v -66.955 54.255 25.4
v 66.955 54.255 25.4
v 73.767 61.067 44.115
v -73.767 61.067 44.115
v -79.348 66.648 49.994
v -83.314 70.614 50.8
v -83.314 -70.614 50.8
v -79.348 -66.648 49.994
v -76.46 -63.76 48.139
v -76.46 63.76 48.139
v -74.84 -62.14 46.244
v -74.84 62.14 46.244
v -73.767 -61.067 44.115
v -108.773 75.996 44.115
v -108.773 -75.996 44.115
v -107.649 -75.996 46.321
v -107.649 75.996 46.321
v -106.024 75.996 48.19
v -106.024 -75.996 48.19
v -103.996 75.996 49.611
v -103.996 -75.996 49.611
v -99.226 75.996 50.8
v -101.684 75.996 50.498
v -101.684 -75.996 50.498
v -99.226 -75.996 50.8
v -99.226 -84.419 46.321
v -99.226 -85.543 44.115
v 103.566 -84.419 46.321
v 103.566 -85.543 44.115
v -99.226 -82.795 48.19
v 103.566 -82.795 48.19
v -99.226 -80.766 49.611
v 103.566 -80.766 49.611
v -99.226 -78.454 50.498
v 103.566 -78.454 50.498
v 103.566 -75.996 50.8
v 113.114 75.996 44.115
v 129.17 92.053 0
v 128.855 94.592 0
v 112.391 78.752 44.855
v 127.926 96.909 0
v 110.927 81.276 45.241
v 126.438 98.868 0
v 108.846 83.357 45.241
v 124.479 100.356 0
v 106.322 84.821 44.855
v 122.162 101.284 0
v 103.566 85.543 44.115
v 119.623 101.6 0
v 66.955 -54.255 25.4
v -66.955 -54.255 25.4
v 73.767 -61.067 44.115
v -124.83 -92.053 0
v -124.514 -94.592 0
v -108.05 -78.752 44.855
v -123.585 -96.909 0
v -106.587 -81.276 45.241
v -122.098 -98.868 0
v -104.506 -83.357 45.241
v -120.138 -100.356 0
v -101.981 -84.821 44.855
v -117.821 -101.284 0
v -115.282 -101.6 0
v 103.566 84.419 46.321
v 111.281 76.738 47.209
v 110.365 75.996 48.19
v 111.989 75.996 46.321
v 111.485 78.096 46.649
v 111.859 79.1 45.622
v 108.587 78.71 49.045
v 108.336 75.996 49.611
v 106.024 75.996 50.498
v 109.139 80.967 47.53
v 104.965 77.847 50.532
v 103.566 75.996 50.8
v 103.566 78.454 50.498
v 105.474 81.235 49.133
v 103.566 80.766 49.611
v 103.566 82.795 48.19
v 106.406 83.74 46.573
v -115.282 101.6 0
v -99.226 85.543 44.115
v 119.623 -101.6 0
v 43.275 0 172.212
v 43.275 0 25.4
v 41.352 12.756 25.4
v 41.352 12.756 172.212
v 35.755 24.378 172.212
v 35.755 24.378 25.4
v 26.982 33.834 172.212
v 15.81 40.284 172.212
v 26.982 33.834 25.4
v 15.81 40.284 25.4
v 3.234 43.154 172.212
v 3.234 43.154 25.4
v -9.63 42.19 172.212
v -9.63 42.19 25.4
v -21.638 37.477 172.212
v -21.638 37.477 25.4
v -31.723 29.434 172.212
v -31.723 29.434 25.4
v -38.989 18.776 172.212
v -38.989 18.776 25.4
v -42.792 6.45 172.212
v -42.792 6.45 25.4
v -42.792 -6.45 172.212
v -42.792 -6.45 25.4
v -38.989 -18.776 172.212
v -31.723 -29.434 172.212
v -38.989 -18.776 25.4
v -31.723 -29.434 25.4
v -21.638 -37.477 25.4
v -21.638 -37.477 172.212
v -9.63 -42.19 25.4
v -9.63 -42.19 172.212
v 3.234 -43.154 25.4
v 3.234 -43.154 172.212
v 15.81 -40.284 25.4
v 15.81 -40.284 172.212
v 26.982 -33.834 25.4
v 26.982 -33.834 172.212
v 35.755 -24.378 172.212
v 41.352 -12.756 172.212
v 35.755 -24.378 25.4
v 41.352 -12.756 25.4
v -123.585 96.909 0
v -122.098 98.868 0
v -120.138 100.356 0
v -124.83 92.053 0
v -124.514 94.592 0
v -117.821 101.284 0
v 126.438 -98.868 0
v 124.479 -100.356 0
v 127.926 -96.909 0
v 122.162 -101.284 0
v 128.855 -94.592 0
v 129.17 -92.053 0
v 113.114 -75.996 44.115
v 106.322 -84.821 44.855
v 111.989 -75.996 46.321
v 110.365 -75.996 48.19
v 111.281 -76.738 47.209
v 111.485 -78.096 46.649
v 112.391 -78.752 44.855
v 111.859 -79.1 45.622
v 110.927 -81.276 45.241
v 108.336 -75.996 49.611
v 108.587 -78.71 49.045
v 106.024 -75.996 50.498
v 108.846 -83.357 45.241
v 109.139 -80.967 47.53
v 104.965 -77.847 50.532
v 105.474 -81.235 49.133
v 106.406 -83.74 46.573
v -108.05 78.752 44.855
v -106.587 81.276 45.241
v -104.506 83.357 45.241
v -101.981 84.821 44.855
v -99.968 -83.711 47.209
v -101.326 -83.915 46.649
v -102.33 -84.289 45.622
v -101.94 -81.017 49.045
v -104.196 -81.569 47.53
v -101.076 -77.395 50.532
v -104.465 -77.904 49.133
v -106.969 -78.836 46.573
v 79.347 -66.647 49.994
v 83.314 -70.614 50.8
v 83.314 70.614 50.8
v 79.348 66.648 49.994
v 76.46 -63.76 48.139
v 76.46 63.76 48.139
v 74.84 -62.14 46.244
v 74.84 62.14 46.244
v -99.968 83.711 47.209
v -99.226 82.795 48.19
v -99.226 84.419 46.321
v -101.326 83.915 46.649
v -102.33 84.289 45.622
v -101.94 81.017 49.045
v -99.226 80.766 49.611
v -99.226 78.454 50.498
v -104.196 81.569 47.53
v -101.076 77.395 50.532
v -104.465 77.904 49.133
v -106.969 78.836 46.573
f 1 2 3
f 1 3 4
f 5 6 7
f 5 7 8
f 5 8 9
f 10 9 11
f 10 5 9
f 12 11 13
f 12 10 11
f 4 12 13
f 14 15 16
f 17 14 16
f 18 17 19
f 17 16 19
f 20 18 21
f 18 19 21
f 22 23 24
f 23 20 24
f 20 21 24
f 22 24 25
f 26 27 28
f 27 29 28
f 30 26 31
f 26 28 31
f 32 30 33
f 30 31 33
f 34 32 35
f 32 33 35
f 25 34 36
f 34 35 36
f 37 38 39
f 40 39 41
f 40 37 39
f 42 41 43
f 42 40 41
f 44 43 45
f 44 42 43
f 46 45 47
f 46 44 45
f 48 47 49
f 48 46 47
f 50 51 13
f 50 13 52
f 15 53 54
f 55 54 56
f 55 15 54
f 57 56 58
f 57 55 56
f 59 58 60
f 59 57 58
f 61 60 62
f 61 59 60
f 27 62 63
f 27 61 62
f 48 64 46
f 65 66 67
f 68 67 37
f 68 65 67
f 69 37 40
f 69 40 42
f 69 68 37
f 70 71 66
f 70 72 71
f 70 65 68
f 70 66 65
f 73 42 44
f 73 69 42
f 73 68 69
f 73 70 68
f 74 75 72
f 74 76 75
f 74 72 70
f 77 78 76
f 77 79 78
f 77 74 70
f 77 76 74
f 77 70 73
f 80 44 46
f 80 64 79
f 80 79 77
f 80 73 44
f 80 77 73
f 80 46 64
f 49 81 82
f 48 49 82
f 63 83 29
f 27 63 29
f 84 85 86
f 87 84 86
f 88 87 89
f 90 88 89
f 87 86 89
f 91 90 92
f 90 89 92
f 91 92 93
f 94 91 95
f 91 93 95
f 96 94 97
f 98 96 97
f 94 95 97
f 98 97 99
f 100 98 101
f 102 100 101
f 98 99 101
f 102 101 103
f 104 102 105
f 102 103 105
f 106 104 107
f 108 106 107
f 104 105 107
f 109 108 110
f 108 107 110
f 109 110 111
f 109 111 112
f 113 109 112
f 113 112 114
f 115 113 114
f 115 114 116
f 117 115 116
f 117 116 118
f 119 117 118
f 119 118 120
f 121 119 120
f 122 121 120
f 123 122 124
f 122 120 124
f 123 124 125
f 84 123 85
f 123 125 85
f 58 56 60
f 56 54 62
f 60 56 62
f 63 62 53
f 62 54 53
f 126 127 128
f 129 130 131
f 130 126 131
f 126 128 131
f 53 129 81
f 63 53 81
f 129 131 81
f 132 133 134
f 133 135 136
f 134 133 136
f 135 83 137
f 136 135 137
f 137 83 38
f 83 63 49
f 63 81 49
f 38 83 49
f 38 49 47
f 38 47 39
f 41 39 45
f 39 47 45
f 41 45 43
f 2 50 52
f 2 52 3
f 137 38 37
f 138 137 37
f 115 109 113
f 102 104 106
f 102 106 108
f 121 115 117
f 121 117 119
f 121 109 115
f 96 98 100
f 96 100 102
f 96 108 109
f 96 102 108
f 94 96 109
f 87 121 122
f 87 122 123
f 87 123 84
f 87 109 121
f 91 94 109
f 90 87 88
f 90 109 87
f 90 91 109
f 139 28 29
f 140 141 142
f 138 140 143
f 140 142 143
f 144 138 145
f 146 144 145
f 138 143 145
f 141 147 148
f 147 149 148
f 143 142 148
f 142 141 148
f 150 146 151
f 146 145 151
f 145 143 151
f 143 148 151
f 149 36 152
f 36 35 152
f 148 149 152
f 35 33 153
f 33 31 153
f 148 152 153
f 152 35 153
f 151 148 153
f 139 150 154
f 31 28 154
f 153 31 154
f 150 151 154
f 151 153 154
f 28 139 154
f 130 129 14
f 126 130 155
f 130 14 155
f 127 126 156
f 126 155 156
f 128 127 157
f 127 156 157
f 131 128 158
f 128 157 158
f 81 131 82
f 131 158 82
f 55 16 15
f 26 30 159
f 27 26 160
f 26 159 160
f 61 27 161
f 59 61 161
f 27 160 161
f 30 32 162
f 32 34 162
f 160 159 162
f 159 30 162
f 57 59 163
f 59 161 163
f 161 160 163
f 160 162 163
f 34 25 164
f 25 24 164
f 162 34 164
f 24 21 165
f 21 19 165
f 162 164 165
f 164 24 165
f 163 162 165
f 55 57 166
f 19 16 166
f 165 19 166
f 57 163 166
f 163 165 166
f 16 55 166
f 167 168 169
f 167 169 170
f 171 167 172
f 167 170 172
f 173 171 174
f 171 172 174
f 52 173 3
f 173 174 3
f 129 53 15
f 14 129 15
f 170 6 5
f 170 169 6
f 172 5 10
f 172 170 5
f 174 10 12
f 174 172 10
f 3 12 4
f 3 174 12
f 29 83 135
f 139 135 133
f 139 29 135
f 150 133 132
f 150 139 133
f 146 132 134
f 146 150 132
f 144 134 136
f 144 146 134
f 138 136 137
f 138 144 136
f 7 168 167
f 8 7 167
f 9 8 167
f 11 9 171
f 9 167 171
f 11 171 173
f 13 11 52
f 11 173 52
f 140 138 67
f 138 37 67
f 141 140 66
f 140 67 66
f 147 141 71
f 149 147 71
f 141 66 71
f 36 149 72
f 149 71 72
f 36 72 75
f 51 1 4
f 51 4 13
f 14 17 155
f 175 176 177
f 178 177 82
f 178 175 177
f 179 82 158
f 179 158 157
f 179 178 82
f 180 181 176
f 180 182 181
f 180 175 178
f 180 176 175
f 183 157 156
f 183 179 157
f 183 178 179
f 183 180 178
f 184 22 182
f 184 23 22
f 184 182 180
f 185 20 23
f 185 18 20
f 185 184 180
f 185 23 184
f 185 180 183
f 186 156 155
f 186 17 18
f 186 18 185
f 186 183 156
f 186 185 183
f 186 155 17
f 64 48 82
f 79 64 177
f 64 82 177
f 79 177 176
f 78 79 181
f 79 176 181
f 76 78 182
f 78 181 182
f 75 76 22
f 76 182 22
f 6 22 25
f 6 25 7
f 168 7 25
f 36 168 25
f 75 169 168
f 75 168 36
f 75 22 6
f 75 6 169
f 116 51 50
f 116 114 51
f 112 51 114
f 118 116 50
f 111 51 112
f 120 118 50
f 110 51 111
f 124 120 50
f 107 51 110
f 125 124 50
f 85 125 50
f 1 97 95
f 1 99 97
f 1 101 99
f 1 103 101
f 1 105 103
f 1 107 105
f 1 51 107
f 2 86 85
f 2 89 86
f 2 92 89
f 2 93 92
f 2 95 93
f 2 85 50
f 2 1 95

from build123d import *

# Parameters (mm, degrees)
F0_W     = 254
F0_H     = 203.2
F1_DEPTH = 50.8
F1_TAPER = 20
F2_W     = 152.4
F2_H     = 127
F3_DEPTH = 25.4
F3_TAPER = 20
F4_R     = 10.16
F5_R     = 43.275006419
F6_DEPTH = 146.812


with BuildPart() as f1:
    # F0 (on Top) → F1 (new body)
    with BuildSketch(Plane.XY):
        with Locations((2.1702556405, 0)):
            Rectangle(F0_W, F0_H)
    extrude(amount=F1_DEPTH, taper=F1_TAPER)

    # F2 (on face) → F3 (cut)
    with BuildSketch(Plane.XY.offset(50.8)):
        Rectangle(F2_W, F2_H)
    extrude(amount=-F3_DEPTH, taper=F3_TAPER, mode=Mode.SUBTRACT)

    # F4
    f4_edges = [f1.edges().sort_by_distance(p)[0] for p in [
        (-106.340056, 0, 50.8),
        (2.170256, 83.110312, 50.8),
        (2.170256, -83.110312, 50.8),
        (110.680568, 0, 50.8),
        (76.2, 0, 50.8),
        (0, 63.5, 50.8),
        (-76.2, 0, 50.8),
        (0, -63.5, 50.8),
        (119.925412, -92.355156, 25.4),
        (119.925412, 92.355156, 25.4),
        (-115.5849, -92.355156, 25.4),
        (-115.5849, 92.355156, 25.4),
    ]]
    fillet(f4_edges, radius=F4_R)

    # F5 (on face) → F6 (join)
    with BuildSketch(Plane.XY.offset(25.4)):
        Circle(F5_R)
    extrude(amount=F6_DEPTH)


solid = f1.part
